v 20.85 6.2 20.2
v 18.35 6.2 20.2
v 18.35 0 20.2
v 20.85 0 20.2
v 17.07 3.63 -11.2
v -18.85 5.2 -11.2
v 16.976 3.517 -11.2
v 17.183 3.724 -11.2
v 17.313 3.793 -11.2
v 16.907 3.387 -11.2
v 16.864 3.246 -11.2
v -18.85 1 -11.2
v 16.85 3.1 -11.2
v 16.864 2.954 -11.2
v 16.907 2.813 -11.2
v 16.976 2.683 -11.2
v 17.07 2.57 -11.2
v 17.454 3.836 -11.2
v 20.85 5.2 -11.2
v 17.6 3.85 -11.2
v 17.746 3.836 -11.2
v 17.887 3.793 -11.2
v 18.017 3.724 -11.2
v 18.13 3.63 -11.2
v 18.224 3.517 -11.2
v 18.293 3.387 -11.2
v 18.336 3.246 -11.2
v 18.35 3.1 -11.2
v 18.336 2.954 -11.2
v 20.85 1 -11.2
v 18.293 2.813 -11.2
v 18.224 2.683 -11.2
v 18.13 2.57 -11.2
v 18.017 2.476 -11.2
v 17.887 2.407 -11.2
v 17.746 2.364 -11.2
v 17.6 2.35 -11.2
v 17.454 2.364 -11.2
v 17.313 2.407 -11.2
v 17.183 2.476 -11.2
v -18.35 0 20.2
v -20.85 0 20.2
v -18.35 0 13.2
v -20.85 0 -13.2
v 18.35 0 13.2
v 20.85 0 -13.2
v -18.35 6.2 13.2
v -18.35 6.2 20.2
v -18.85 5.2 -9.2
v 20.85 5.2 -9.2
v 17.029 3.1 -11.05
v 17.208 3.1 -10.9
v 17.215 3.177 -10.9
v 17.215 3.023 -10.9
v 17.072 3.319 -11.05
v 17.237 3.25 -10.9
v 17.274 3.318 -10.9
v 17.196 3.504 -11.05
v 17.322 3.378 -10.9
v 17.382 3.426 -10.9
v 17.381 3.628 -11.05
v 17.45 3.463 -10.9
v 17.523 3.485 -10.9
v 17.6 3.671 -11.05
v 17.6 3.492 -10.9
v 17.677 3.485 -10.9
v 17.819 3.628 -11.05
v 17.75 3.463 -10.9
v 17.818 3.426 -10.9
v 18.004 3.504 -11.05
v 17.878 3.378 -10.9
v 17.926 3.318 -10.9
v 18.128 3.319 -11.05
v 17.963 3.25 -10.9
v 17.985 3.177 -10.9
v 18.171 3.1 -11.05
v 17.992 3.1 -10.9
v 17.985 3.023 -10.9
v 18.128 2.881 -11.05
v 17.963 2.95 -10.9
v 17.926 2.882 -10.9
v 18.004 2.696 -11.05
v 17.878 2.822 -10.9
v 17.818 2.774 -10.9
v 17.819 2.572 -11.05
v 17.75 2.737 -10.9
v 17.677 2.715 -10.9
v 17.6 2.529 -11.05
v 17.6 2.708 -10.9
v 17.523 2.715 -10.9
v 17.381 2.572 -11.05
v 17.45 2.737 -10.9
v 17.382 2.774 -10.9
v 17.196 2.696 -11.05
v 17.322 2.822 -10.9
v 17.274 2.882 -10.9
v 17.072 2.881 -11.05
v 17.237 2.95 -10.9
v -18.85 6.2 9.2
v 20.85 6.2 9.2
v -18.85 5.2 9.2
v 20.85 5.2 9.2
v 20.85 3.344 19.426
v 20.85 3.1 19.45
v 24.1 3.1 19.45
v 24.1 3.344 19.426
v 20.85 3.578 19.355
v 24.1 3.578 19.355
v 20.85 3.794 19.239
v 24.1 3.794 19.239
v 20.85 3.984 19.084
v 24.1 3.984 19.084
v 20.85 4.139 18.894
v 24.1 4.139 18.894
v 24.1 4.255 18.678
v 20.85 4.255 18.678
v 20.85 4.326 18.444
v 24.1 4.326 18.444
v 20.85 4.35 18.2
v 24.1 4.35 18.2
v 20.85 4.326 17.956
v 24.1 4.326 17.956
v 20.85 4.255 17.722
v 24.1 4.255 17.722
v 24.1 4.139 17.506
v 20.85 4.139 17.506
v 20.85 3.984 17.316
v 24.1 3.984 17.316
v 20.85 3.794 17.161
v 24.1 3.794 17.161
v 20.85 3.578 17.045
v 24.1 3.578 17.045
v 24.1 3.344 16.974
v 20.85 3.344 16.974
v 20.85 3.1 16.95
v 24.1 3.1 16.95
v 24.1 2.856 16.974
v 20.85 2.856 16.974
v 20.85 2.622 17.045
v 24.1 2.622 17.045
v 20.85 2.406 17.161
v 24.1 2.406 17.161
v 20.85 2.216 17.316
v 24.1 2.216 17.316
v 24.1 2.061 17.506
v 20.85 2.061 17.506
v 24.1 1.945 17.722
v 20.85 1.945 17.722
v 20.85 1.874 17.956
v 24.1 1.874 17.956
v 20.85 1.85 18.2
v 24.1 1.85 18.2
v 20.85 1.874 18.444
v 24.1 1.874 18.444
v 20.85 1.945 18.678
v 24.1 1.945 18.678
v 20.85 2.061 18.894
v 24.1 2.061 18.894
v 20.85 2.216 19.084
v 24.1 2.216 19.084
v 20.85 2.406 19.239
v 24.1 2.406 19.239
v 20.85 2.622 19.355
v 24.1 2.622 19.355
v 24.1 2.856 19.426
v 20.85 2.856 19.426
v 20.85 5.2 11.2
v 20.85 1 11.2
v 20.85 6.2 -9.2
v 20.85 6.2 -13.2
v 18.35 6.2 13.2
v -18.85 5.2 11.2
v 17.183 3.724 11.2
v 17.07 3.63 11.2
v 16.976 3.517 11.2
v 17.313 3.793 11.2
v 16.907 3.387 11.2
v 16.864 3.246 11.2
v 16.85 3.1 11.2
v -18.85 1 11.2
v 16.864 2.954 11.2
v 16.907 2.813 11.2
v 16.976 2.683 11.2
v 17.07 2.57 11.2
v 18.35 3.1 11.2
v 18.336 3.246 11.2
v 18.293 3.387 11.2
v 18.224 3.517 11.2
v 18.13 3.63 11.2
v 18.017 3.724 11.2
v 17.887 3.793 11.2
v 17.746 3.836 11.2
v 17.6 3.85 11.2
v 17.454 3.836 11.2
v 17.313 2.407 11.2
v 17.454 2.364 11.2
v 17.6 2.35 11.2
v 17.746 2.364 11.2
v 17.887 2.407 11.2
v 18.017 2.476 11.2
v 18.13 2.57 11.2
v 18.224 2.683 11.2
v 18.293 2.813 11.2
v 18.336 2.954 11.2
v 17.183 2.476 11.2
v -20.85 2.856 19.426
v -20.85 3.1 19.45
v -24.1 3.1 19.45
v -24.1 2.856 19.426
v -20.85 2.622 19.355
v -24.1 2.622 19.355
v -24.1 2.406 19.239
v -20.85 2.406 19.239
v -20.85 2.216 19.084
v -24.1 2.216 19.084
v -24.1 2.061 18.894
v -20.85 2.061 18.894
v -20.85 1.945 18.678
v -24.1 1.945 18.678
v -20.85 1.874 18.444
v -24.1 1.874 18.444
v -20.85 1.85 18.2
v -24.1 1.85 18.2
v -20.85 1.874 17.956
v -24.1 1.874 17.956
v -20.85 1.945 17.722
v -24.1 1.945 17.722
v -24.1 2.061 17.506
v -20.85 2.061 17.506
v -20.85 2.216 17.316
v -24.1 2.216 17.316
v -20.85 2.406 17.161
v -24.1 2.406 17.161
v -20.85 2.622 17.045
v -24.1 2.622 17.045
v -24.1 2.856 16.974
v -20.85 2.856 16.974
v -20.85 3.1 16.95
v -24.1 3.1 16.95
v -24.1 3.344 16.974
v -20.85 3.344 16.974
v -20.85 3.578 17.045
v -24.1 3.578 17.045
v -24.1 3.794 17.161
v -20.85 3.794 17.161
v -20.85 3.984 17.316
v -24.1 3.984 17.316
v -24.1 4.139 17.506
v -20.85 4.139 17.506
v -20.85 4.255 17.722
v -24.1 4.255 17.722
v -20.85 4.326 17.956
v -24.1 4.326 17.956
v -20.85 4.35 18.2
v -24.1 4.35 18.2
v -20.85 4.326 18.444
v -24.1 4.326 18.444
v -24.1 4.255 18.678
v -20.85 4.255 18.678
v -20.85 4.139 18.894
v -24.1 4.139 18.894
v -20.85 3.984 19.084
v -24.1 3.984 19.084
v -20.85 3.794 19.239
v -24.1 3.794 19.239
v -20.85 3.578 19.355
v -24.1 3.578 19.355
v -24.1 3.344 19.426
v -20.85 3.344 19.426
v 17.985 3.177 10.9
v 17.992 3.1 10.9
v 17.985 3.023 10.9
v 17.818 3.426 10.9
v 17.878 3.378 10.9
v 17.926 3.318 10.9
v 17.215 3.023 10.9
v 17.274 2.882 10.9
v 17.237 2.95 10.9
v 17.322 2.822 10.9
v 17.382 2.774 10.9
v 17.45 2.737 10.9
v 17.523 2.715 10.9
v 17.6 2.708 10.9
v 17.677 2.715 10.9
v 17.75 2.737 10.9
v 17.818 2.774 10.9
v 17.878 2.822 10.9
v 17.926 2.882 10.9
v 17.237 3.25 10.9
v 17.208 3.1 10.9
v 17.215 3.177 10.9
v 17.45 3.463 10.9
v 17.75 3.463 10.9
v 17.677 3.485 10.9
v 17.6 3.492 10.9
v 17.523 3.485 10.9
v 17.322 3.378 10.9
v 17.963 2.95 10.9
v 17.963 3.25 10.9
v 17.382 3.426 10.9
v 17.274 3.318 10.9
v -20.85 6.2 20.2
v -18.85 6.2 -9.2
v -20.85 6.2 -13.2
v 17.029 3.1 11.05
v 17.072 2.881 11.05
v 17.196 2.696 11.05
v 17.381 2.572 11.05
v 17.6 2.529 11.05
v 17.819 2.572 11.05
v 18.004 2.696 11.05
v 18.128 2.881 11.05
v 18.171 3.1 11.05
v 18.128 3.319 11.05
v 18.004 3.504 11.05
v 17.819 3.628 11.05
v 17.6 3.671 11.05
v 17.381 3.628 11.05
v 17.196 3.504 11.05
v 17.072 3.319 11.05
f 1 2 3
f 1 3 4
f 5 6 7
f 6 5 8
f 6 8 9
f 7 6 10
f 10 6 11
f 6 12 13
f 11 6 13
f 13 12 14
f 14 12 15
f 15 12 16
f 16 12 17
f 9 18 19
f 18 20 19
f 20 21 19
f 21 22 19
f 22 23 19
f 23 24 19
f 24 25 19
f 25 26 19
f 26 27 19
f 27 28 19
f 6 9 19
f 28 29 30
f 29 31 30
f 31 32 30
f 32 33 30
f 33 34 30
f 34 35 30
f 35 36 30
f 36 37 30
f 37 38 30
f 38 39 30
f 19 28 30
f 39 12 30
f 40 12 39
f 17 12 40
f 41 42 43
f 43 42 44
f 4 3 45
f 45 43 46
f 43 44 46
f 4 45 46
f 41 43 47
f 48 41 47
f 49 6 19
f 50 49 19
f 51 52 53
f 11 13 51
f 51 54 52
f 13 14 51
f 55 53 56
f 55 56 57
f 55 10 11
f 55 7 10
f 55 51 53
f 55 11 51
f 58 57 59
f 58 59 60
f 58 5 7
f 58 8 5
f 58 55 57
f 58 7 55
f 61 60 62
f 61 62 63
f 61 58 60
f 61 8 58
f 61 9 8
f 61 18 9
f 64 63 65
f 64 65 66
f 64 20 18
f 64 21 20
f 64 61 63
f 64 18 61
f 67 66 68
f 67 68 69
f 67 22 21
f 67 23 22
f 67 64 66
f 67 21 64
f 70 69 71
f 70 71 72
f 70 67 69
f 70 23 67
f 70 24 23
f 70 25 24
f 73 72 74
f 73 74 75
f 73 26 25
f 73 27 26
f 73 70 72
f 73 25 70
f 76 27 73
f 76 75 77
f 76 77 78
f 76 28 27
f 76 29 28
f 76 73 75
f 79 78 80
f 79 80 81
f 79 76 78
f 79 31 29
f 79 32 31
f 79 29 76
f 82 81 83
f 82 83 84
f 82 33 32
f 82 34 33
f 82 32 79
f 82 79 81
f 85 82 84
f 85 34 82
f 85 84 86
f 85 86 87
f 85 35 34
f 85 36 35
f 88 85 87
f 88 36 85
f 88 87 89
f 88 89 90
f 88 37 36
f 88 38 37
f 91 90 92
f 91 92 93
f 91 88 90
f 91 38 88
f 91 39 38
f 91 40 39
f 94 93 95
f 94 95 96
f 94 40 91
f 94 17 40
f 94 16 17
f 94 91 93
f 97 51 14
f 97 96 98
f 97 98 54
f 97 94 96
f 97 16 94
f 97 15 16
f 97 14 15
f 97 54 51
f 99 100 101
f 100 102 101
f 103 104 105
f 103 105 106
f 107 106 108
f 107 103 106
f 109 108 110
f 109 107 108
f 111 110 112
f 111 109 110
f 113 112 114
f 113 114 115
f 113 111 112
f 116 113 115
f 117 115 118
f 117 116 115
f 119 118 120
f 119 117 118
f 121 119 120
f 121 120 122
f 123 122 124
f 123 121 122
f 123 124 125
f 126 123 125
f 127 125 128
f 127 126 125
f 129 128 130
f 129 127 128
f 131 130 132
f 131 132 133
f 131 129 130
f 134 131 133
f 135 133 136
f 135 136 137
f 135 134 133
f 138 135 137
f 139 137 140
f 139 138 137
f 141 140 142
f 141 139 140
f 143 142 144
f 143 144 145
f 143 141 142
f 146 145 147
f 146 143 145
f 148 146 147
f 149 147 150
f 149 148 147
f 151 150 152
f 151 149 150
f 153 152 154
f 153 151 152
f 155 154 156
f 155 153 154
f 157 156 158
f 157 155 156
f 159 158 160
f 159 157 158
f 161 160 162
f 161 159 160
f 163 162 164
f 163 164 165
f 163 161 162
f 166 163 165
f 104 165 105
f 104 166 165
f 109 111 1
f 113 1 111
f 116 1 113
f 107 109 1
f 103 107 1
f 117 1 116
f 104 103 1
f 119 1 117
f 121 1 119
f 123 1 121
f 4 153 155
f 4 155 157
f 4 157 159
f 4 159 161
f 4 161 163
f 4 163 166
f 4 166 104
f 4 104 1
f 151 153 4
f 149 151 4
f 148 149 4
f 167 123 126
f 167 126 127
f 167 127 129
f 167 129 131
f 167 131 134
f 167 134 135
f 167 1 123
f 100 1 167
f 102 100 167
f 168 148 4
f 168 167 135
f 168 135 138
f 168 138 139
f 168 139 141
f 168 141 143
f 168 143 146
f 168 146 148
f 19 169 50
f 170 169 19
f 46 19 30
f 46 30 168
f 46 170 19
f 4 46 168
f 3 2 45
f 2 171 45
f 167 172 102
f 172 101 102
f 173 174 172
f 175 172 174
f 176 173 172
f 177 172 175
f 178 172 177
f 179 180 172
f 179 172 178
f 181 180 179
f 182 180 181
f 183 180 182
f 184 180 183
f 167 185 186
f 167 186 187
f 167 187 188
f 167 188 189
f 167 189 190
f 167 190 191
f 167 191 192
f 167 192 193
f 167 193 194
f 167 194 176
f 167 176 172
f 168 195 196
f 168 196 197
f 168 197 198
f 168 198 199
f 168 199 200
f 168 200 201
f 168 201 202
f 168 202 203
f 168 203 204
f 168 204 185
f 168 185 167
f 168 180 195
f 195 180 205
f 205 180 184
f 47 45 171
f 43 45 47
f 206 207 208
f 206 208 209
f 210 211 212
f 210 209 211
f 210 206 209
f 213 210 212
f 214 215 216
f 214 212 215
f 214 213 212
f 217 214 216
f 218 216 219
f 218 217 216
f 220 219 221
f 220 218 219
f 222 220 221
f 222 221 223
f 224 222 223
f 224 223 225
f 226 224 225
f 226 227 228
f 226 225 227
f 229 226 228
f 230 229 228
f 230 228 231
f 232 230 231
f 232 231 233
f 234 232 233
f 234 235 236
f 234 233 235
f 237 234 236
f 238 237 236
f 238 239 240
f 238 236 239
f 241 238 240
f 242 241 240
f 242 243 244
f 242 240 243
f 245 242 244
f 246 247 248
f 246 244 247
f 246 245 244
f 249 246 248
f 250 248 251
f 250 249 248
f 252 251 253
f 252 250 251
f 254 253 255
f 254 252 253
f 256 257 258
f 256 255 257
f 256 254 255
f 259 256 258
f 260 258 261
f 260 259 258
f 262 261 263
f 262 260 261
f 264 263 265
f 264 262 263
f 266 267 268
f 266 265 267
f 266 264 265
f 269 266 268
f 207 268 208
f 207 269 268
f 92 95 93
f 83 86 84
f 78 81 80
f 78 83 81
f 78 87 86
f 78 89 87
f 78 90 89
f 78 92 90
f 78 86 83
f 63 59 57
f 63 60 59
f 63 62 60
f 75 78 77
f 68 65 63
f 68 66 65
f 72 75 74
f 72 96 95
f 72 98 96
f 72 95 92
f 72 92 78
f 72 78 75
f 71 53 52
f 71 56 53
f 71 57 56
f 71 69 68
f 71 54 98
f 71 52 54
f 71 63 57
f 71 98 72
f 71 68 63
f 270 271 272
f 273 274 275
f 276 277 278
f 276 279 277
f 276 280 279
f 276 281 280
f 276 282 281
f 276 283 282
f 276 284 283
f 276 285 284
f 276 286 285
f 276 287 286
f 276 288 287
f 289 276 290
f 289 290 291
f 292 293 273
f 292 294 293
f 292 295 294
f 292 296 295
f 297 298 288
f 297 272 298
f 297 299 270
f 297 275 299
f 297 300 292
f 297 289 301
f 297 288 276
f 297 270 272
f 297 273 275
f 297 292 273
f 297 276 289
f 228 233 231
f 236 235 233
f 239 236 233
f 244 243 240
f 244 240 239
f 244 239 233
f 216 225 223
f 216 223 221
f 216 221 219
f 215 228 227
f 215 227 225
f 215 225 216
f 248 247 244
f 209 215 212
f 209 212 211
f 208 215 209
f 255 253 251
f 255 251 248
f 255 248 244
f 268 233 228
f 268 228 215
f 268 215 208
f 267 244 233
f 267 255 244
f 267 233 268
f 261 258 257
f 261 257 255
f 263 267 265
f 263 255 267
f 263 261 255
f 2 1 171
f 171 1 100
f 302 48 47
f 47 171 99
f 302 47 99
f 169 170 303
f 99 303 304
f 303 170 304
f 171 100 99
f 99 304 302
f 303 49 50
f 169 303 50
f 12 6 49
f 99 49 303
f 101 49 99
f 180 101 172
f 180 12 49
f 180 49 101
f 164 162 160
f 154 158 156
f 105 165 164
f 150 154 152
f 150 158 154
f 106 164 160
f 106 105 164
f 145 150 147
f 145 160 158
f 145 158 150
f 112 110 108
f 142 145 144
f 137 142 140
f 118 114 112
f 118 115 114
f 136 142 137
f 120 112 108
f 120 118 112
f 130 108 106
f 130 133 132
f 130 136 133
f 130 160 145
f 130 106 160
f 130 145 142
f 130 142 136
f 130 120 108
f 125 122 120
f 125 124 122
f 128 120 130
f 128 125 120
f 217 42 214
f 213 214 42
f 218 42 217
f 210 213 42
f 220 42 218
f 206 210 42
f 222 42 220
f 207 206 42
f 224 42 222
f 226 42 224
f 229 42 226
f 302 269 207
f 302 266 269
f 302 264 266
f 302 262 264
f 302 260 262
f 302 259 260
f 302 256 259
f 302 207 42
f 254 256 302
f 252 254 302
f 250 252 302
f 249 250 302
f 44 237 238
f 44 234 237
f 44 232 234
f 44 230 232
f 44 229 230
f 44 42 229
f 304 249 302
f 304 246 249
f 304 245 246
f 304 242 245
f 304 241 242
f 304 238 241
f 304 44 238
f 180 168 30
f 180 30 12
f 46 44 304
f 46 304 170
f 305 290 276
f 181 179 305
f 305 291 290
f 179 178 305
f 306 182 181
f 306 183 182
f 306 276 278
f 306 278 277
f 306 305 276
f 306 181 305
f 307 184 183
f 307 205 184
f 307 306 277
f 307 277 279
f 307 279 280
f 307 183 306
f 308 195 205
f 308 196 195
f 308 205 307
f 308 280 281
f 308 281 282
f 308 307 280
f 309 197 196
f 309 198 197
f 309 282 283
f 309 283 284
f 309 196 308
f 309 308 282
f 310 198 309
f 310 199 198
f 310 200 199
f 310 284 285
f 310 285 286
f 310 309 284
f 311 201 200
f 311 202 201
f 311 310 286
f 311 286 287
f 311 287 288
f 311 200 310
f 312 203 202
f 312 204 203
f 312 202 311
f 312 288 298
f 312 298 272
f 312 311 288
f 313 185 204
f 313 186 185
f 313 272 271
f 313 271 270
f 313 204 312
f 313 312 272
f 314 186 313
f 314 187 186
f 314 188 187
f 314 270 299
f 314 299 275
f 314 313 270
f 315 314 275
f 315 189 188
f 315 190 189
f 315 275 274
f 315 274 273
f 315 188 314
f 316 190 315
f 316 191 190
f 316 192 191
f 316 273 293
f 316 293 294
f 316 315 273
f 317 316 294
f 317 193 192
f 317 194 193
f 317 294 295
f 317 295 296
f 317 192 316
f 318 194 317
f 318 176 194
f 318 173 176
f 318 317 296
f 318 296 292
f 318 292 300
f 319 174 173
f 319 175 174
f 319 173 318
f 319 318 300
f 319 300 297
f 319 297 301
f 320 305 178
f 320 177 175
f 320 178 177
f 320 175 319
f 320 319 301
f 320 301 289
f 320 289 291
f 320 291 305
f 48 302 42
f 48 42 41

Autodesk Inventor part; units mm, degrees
ref_plane "YZ Plane" through (0, 0, 0) normal (1, 0, 0) x (0, 1, 0)
ref_plane "XZ Plane" through (0, 0, 0) normal (0, 1, 0) x (-1, 0, 0)
ref_plane "XY Plane" through (0, 0, 0) normal (0, 0, 1) x (1, 0, 0)
sketch "Skizze1" plane through (0, 0, 0) normal (0, 1, 0) x (-1, 0, 0)
  line L0 (-20.85, 11.2) -> (18.85, 11.2)
  line L1 (18.85, 11.2) -> (18.85, -11.2)
  line L2 (18.85, -11.2) -> (-20.85, -11.2)
  line L3 (-20.85, -11.2) -> (-20.85, 11.2)
  line L4 (-20.85, 11.2) -> (18.85, -11.2) construction
  line L5 (18.85, 11.2) -> (-20.85, -11.2) construction
  point P0 (0, 0)
  point P1 (-1, 0)
  dimension "d24" = 39.7
  dimension "d25" = 22.4
  dimension "d26" = 1
  dimension "d27" = 0
extrude "Extrusion1" add sketch "Skizze1" along normal blind 1
sketch "Skizze2" plane through (0, 0, 0) normal (0, 1, 0) x (-1, 0, 0)
  line L0 (-20.85, 11.2) -> (-20.85, -11.2) projected
  line L1 (18.85, 11.2) -> (-20.85, 11.2) projected
  line L2 (20.85, -13.2) -> (-20.85, -13.2)
  line L3 (-20.85, -13.2) -> (-20.85, 13.2)
  line L4 (-20.85, 13.2) -> (20.85, 13.2)
  line L5 (20.85, 13.2) -> (20.85, -13.2)
  line L6 (20.85, -13.2) -> (-20.85, 13.2) construction
  line L7 (-20.85, -13.2) -> (20.85, 13.2) construction
  line L8 (18.85, -11.2) -> (18.85, 11.2) projected
  line L9 (-20.85, 11.2) -> (18.85, 11.2)
  line L10 (18.85, 11.2) -> (18.85, -11.2)
  line L11 (18.85, -11.2) -> (-20.85, -11.2)
  point P0 (0, 0)
  dimension "d30" = 2
  dimension "d31" = 2
extrude "Extrusion2" add sketch "Skizze2" along normal blind 5.2 contours L3 L4 L5 L2 L11 L8 L1
sketch "Skizze3" plane through (0, 5.2, 0) normal (0, 1, 0) x (1, 0, 0)
  line L0 (20.85, 13.2) -> (-20.85, 13.2)
  line L1 (20.85, -13.2) -> (20.85, 13.2) projected
  line L2 (-20.85, 13.2) -> (20.85, 13.2)
  line L3 (20.85, 13.2) -> (20.85, -13.2)
  line L4 (20.85, -13.2) -> (-20.85, -13.2)
  line L5 (-20.85, -13.2) -> (-20.85, 13.2)
  line L6 (-20.85, 13.2) -> (20.85, -13.2) construction
  line L7 (20.85, 13.2) -> (-20.85, -13.2) construction
  line L8 (20.85, -11.2) -> (20.85, 11.2) projected
  line L9 (20.85, 9.2) -> (20.85, -9.2)
  line L10 (20.85, -11.2) -> (-18.85, -11.2) projected
  line L11 (-18.85, 11.2) -> (20.85, 11.2) projected
  line L12 (-18.85, -11.2) -> (-18.85, 11.2) projected
  line L13 (20.85, -9.2) -> (-18.85, -9.2)
  line L14 (-18.85, 9.2) -> (20.85, 9.2)
  point P0 (0, 0)
  point P1 (20.85, -9.2)
  dimension "d35" = 2
  dimension "d36" = 2
extrude "Extrusion3" add sketch "Skizze3" along normal blind 1 contours L1 L11 L12 L10 L4 L5 L0 | L1 L14 L12 L11 | L1 L10 L12 L13
sketch "Skizze7" plane through (20.85, 1, 11.2) normal (0, 0, -1) x (-1, 0, 0)
  line L0 (39.7, 4.2) -> (0, 4.2) construction
  line L1 (3.25, 4.2) -> (3.25, 0) construction
  line L2 (0, 0) -> (39.7, 0) construction
  line L3 (0, -1) -> (0, 5.2) construction
  circle A0 centre (3.25, 2.1) radius 0.75
  point P0 (20.85, -1)
  dimension "d38" = 1.5
  dimension "d39" = 2.5
extrude "Extrusion7" add sketch "Skizze7" along normal blind 0.3 draft -50
mirror "Spiegeln2" about plane through (0, 0, 0) normal (0, 0, 1) of "Extrusion7"
sketch "Skizze8" plane through (-20.85, 0, 13.2) normal (0, 0, 1) x (1, 0, 0)
  line L0 (0, 0) -> (0, 6.2) projected
  line L1 (41.7, 6.2) -> (2, 6.2) projected
  line L2 (0, 0) -> (2.5, 0)
  line L3 (2.5, 0) -> (2.5, 6.2)
  line L4 (2.5, 6.2) -> (0, 6.2)
  line L5 (0, 6.2) -> (0, 0)
  point P0 (20.85, 0)
  dimension "d42" = 2.5
extrude "Extrusion8" add sketch "Skizze8" along normal blind 7
sketch "Skizze9" plane through (-20.85, 0, -13.2) normal (-1, 0, 0) x (0, 0, 1)
  line L0 (26.4, 6.2) -> (33.4, 6.2) construction
  line L1 (31.4, 6.2) -> (31.4, 0) construction
  line L2 (33.4, 6.2) -> (33.4, 0) construction
  circle A0 centre (31.4, 3.1) radius 1.25
  point P0 (13.2, 0)
  dimension "d45" = 2
  dimension "d46" = 2.5
extrude "Extrusion9" add sketch "Skizze9" along normal blind 3.25
mirror "Spiegeln3" about plane through (0, 0, 0) normal (1, 0, 0) of "Extrusion8", "Extrusion9"
sketch "Skizze10" plane through (-20.85, 0, -13.2) normal (-1, 0, 0) x (0, 0, 1)
  line L0 (26.4, 6.2) -> (26.4, 0) projected
  line L1 (26.4, 6.2) -> (26.4, 0)
  line L2 (0, 0) -> (33.4, 0) projected
  circle A0 centre (31.4, 3.1) radius 1.25 projected
  point P0 (13.2, 0)
  dimension "d49" = 3.75
properties part number "CaseV1"
